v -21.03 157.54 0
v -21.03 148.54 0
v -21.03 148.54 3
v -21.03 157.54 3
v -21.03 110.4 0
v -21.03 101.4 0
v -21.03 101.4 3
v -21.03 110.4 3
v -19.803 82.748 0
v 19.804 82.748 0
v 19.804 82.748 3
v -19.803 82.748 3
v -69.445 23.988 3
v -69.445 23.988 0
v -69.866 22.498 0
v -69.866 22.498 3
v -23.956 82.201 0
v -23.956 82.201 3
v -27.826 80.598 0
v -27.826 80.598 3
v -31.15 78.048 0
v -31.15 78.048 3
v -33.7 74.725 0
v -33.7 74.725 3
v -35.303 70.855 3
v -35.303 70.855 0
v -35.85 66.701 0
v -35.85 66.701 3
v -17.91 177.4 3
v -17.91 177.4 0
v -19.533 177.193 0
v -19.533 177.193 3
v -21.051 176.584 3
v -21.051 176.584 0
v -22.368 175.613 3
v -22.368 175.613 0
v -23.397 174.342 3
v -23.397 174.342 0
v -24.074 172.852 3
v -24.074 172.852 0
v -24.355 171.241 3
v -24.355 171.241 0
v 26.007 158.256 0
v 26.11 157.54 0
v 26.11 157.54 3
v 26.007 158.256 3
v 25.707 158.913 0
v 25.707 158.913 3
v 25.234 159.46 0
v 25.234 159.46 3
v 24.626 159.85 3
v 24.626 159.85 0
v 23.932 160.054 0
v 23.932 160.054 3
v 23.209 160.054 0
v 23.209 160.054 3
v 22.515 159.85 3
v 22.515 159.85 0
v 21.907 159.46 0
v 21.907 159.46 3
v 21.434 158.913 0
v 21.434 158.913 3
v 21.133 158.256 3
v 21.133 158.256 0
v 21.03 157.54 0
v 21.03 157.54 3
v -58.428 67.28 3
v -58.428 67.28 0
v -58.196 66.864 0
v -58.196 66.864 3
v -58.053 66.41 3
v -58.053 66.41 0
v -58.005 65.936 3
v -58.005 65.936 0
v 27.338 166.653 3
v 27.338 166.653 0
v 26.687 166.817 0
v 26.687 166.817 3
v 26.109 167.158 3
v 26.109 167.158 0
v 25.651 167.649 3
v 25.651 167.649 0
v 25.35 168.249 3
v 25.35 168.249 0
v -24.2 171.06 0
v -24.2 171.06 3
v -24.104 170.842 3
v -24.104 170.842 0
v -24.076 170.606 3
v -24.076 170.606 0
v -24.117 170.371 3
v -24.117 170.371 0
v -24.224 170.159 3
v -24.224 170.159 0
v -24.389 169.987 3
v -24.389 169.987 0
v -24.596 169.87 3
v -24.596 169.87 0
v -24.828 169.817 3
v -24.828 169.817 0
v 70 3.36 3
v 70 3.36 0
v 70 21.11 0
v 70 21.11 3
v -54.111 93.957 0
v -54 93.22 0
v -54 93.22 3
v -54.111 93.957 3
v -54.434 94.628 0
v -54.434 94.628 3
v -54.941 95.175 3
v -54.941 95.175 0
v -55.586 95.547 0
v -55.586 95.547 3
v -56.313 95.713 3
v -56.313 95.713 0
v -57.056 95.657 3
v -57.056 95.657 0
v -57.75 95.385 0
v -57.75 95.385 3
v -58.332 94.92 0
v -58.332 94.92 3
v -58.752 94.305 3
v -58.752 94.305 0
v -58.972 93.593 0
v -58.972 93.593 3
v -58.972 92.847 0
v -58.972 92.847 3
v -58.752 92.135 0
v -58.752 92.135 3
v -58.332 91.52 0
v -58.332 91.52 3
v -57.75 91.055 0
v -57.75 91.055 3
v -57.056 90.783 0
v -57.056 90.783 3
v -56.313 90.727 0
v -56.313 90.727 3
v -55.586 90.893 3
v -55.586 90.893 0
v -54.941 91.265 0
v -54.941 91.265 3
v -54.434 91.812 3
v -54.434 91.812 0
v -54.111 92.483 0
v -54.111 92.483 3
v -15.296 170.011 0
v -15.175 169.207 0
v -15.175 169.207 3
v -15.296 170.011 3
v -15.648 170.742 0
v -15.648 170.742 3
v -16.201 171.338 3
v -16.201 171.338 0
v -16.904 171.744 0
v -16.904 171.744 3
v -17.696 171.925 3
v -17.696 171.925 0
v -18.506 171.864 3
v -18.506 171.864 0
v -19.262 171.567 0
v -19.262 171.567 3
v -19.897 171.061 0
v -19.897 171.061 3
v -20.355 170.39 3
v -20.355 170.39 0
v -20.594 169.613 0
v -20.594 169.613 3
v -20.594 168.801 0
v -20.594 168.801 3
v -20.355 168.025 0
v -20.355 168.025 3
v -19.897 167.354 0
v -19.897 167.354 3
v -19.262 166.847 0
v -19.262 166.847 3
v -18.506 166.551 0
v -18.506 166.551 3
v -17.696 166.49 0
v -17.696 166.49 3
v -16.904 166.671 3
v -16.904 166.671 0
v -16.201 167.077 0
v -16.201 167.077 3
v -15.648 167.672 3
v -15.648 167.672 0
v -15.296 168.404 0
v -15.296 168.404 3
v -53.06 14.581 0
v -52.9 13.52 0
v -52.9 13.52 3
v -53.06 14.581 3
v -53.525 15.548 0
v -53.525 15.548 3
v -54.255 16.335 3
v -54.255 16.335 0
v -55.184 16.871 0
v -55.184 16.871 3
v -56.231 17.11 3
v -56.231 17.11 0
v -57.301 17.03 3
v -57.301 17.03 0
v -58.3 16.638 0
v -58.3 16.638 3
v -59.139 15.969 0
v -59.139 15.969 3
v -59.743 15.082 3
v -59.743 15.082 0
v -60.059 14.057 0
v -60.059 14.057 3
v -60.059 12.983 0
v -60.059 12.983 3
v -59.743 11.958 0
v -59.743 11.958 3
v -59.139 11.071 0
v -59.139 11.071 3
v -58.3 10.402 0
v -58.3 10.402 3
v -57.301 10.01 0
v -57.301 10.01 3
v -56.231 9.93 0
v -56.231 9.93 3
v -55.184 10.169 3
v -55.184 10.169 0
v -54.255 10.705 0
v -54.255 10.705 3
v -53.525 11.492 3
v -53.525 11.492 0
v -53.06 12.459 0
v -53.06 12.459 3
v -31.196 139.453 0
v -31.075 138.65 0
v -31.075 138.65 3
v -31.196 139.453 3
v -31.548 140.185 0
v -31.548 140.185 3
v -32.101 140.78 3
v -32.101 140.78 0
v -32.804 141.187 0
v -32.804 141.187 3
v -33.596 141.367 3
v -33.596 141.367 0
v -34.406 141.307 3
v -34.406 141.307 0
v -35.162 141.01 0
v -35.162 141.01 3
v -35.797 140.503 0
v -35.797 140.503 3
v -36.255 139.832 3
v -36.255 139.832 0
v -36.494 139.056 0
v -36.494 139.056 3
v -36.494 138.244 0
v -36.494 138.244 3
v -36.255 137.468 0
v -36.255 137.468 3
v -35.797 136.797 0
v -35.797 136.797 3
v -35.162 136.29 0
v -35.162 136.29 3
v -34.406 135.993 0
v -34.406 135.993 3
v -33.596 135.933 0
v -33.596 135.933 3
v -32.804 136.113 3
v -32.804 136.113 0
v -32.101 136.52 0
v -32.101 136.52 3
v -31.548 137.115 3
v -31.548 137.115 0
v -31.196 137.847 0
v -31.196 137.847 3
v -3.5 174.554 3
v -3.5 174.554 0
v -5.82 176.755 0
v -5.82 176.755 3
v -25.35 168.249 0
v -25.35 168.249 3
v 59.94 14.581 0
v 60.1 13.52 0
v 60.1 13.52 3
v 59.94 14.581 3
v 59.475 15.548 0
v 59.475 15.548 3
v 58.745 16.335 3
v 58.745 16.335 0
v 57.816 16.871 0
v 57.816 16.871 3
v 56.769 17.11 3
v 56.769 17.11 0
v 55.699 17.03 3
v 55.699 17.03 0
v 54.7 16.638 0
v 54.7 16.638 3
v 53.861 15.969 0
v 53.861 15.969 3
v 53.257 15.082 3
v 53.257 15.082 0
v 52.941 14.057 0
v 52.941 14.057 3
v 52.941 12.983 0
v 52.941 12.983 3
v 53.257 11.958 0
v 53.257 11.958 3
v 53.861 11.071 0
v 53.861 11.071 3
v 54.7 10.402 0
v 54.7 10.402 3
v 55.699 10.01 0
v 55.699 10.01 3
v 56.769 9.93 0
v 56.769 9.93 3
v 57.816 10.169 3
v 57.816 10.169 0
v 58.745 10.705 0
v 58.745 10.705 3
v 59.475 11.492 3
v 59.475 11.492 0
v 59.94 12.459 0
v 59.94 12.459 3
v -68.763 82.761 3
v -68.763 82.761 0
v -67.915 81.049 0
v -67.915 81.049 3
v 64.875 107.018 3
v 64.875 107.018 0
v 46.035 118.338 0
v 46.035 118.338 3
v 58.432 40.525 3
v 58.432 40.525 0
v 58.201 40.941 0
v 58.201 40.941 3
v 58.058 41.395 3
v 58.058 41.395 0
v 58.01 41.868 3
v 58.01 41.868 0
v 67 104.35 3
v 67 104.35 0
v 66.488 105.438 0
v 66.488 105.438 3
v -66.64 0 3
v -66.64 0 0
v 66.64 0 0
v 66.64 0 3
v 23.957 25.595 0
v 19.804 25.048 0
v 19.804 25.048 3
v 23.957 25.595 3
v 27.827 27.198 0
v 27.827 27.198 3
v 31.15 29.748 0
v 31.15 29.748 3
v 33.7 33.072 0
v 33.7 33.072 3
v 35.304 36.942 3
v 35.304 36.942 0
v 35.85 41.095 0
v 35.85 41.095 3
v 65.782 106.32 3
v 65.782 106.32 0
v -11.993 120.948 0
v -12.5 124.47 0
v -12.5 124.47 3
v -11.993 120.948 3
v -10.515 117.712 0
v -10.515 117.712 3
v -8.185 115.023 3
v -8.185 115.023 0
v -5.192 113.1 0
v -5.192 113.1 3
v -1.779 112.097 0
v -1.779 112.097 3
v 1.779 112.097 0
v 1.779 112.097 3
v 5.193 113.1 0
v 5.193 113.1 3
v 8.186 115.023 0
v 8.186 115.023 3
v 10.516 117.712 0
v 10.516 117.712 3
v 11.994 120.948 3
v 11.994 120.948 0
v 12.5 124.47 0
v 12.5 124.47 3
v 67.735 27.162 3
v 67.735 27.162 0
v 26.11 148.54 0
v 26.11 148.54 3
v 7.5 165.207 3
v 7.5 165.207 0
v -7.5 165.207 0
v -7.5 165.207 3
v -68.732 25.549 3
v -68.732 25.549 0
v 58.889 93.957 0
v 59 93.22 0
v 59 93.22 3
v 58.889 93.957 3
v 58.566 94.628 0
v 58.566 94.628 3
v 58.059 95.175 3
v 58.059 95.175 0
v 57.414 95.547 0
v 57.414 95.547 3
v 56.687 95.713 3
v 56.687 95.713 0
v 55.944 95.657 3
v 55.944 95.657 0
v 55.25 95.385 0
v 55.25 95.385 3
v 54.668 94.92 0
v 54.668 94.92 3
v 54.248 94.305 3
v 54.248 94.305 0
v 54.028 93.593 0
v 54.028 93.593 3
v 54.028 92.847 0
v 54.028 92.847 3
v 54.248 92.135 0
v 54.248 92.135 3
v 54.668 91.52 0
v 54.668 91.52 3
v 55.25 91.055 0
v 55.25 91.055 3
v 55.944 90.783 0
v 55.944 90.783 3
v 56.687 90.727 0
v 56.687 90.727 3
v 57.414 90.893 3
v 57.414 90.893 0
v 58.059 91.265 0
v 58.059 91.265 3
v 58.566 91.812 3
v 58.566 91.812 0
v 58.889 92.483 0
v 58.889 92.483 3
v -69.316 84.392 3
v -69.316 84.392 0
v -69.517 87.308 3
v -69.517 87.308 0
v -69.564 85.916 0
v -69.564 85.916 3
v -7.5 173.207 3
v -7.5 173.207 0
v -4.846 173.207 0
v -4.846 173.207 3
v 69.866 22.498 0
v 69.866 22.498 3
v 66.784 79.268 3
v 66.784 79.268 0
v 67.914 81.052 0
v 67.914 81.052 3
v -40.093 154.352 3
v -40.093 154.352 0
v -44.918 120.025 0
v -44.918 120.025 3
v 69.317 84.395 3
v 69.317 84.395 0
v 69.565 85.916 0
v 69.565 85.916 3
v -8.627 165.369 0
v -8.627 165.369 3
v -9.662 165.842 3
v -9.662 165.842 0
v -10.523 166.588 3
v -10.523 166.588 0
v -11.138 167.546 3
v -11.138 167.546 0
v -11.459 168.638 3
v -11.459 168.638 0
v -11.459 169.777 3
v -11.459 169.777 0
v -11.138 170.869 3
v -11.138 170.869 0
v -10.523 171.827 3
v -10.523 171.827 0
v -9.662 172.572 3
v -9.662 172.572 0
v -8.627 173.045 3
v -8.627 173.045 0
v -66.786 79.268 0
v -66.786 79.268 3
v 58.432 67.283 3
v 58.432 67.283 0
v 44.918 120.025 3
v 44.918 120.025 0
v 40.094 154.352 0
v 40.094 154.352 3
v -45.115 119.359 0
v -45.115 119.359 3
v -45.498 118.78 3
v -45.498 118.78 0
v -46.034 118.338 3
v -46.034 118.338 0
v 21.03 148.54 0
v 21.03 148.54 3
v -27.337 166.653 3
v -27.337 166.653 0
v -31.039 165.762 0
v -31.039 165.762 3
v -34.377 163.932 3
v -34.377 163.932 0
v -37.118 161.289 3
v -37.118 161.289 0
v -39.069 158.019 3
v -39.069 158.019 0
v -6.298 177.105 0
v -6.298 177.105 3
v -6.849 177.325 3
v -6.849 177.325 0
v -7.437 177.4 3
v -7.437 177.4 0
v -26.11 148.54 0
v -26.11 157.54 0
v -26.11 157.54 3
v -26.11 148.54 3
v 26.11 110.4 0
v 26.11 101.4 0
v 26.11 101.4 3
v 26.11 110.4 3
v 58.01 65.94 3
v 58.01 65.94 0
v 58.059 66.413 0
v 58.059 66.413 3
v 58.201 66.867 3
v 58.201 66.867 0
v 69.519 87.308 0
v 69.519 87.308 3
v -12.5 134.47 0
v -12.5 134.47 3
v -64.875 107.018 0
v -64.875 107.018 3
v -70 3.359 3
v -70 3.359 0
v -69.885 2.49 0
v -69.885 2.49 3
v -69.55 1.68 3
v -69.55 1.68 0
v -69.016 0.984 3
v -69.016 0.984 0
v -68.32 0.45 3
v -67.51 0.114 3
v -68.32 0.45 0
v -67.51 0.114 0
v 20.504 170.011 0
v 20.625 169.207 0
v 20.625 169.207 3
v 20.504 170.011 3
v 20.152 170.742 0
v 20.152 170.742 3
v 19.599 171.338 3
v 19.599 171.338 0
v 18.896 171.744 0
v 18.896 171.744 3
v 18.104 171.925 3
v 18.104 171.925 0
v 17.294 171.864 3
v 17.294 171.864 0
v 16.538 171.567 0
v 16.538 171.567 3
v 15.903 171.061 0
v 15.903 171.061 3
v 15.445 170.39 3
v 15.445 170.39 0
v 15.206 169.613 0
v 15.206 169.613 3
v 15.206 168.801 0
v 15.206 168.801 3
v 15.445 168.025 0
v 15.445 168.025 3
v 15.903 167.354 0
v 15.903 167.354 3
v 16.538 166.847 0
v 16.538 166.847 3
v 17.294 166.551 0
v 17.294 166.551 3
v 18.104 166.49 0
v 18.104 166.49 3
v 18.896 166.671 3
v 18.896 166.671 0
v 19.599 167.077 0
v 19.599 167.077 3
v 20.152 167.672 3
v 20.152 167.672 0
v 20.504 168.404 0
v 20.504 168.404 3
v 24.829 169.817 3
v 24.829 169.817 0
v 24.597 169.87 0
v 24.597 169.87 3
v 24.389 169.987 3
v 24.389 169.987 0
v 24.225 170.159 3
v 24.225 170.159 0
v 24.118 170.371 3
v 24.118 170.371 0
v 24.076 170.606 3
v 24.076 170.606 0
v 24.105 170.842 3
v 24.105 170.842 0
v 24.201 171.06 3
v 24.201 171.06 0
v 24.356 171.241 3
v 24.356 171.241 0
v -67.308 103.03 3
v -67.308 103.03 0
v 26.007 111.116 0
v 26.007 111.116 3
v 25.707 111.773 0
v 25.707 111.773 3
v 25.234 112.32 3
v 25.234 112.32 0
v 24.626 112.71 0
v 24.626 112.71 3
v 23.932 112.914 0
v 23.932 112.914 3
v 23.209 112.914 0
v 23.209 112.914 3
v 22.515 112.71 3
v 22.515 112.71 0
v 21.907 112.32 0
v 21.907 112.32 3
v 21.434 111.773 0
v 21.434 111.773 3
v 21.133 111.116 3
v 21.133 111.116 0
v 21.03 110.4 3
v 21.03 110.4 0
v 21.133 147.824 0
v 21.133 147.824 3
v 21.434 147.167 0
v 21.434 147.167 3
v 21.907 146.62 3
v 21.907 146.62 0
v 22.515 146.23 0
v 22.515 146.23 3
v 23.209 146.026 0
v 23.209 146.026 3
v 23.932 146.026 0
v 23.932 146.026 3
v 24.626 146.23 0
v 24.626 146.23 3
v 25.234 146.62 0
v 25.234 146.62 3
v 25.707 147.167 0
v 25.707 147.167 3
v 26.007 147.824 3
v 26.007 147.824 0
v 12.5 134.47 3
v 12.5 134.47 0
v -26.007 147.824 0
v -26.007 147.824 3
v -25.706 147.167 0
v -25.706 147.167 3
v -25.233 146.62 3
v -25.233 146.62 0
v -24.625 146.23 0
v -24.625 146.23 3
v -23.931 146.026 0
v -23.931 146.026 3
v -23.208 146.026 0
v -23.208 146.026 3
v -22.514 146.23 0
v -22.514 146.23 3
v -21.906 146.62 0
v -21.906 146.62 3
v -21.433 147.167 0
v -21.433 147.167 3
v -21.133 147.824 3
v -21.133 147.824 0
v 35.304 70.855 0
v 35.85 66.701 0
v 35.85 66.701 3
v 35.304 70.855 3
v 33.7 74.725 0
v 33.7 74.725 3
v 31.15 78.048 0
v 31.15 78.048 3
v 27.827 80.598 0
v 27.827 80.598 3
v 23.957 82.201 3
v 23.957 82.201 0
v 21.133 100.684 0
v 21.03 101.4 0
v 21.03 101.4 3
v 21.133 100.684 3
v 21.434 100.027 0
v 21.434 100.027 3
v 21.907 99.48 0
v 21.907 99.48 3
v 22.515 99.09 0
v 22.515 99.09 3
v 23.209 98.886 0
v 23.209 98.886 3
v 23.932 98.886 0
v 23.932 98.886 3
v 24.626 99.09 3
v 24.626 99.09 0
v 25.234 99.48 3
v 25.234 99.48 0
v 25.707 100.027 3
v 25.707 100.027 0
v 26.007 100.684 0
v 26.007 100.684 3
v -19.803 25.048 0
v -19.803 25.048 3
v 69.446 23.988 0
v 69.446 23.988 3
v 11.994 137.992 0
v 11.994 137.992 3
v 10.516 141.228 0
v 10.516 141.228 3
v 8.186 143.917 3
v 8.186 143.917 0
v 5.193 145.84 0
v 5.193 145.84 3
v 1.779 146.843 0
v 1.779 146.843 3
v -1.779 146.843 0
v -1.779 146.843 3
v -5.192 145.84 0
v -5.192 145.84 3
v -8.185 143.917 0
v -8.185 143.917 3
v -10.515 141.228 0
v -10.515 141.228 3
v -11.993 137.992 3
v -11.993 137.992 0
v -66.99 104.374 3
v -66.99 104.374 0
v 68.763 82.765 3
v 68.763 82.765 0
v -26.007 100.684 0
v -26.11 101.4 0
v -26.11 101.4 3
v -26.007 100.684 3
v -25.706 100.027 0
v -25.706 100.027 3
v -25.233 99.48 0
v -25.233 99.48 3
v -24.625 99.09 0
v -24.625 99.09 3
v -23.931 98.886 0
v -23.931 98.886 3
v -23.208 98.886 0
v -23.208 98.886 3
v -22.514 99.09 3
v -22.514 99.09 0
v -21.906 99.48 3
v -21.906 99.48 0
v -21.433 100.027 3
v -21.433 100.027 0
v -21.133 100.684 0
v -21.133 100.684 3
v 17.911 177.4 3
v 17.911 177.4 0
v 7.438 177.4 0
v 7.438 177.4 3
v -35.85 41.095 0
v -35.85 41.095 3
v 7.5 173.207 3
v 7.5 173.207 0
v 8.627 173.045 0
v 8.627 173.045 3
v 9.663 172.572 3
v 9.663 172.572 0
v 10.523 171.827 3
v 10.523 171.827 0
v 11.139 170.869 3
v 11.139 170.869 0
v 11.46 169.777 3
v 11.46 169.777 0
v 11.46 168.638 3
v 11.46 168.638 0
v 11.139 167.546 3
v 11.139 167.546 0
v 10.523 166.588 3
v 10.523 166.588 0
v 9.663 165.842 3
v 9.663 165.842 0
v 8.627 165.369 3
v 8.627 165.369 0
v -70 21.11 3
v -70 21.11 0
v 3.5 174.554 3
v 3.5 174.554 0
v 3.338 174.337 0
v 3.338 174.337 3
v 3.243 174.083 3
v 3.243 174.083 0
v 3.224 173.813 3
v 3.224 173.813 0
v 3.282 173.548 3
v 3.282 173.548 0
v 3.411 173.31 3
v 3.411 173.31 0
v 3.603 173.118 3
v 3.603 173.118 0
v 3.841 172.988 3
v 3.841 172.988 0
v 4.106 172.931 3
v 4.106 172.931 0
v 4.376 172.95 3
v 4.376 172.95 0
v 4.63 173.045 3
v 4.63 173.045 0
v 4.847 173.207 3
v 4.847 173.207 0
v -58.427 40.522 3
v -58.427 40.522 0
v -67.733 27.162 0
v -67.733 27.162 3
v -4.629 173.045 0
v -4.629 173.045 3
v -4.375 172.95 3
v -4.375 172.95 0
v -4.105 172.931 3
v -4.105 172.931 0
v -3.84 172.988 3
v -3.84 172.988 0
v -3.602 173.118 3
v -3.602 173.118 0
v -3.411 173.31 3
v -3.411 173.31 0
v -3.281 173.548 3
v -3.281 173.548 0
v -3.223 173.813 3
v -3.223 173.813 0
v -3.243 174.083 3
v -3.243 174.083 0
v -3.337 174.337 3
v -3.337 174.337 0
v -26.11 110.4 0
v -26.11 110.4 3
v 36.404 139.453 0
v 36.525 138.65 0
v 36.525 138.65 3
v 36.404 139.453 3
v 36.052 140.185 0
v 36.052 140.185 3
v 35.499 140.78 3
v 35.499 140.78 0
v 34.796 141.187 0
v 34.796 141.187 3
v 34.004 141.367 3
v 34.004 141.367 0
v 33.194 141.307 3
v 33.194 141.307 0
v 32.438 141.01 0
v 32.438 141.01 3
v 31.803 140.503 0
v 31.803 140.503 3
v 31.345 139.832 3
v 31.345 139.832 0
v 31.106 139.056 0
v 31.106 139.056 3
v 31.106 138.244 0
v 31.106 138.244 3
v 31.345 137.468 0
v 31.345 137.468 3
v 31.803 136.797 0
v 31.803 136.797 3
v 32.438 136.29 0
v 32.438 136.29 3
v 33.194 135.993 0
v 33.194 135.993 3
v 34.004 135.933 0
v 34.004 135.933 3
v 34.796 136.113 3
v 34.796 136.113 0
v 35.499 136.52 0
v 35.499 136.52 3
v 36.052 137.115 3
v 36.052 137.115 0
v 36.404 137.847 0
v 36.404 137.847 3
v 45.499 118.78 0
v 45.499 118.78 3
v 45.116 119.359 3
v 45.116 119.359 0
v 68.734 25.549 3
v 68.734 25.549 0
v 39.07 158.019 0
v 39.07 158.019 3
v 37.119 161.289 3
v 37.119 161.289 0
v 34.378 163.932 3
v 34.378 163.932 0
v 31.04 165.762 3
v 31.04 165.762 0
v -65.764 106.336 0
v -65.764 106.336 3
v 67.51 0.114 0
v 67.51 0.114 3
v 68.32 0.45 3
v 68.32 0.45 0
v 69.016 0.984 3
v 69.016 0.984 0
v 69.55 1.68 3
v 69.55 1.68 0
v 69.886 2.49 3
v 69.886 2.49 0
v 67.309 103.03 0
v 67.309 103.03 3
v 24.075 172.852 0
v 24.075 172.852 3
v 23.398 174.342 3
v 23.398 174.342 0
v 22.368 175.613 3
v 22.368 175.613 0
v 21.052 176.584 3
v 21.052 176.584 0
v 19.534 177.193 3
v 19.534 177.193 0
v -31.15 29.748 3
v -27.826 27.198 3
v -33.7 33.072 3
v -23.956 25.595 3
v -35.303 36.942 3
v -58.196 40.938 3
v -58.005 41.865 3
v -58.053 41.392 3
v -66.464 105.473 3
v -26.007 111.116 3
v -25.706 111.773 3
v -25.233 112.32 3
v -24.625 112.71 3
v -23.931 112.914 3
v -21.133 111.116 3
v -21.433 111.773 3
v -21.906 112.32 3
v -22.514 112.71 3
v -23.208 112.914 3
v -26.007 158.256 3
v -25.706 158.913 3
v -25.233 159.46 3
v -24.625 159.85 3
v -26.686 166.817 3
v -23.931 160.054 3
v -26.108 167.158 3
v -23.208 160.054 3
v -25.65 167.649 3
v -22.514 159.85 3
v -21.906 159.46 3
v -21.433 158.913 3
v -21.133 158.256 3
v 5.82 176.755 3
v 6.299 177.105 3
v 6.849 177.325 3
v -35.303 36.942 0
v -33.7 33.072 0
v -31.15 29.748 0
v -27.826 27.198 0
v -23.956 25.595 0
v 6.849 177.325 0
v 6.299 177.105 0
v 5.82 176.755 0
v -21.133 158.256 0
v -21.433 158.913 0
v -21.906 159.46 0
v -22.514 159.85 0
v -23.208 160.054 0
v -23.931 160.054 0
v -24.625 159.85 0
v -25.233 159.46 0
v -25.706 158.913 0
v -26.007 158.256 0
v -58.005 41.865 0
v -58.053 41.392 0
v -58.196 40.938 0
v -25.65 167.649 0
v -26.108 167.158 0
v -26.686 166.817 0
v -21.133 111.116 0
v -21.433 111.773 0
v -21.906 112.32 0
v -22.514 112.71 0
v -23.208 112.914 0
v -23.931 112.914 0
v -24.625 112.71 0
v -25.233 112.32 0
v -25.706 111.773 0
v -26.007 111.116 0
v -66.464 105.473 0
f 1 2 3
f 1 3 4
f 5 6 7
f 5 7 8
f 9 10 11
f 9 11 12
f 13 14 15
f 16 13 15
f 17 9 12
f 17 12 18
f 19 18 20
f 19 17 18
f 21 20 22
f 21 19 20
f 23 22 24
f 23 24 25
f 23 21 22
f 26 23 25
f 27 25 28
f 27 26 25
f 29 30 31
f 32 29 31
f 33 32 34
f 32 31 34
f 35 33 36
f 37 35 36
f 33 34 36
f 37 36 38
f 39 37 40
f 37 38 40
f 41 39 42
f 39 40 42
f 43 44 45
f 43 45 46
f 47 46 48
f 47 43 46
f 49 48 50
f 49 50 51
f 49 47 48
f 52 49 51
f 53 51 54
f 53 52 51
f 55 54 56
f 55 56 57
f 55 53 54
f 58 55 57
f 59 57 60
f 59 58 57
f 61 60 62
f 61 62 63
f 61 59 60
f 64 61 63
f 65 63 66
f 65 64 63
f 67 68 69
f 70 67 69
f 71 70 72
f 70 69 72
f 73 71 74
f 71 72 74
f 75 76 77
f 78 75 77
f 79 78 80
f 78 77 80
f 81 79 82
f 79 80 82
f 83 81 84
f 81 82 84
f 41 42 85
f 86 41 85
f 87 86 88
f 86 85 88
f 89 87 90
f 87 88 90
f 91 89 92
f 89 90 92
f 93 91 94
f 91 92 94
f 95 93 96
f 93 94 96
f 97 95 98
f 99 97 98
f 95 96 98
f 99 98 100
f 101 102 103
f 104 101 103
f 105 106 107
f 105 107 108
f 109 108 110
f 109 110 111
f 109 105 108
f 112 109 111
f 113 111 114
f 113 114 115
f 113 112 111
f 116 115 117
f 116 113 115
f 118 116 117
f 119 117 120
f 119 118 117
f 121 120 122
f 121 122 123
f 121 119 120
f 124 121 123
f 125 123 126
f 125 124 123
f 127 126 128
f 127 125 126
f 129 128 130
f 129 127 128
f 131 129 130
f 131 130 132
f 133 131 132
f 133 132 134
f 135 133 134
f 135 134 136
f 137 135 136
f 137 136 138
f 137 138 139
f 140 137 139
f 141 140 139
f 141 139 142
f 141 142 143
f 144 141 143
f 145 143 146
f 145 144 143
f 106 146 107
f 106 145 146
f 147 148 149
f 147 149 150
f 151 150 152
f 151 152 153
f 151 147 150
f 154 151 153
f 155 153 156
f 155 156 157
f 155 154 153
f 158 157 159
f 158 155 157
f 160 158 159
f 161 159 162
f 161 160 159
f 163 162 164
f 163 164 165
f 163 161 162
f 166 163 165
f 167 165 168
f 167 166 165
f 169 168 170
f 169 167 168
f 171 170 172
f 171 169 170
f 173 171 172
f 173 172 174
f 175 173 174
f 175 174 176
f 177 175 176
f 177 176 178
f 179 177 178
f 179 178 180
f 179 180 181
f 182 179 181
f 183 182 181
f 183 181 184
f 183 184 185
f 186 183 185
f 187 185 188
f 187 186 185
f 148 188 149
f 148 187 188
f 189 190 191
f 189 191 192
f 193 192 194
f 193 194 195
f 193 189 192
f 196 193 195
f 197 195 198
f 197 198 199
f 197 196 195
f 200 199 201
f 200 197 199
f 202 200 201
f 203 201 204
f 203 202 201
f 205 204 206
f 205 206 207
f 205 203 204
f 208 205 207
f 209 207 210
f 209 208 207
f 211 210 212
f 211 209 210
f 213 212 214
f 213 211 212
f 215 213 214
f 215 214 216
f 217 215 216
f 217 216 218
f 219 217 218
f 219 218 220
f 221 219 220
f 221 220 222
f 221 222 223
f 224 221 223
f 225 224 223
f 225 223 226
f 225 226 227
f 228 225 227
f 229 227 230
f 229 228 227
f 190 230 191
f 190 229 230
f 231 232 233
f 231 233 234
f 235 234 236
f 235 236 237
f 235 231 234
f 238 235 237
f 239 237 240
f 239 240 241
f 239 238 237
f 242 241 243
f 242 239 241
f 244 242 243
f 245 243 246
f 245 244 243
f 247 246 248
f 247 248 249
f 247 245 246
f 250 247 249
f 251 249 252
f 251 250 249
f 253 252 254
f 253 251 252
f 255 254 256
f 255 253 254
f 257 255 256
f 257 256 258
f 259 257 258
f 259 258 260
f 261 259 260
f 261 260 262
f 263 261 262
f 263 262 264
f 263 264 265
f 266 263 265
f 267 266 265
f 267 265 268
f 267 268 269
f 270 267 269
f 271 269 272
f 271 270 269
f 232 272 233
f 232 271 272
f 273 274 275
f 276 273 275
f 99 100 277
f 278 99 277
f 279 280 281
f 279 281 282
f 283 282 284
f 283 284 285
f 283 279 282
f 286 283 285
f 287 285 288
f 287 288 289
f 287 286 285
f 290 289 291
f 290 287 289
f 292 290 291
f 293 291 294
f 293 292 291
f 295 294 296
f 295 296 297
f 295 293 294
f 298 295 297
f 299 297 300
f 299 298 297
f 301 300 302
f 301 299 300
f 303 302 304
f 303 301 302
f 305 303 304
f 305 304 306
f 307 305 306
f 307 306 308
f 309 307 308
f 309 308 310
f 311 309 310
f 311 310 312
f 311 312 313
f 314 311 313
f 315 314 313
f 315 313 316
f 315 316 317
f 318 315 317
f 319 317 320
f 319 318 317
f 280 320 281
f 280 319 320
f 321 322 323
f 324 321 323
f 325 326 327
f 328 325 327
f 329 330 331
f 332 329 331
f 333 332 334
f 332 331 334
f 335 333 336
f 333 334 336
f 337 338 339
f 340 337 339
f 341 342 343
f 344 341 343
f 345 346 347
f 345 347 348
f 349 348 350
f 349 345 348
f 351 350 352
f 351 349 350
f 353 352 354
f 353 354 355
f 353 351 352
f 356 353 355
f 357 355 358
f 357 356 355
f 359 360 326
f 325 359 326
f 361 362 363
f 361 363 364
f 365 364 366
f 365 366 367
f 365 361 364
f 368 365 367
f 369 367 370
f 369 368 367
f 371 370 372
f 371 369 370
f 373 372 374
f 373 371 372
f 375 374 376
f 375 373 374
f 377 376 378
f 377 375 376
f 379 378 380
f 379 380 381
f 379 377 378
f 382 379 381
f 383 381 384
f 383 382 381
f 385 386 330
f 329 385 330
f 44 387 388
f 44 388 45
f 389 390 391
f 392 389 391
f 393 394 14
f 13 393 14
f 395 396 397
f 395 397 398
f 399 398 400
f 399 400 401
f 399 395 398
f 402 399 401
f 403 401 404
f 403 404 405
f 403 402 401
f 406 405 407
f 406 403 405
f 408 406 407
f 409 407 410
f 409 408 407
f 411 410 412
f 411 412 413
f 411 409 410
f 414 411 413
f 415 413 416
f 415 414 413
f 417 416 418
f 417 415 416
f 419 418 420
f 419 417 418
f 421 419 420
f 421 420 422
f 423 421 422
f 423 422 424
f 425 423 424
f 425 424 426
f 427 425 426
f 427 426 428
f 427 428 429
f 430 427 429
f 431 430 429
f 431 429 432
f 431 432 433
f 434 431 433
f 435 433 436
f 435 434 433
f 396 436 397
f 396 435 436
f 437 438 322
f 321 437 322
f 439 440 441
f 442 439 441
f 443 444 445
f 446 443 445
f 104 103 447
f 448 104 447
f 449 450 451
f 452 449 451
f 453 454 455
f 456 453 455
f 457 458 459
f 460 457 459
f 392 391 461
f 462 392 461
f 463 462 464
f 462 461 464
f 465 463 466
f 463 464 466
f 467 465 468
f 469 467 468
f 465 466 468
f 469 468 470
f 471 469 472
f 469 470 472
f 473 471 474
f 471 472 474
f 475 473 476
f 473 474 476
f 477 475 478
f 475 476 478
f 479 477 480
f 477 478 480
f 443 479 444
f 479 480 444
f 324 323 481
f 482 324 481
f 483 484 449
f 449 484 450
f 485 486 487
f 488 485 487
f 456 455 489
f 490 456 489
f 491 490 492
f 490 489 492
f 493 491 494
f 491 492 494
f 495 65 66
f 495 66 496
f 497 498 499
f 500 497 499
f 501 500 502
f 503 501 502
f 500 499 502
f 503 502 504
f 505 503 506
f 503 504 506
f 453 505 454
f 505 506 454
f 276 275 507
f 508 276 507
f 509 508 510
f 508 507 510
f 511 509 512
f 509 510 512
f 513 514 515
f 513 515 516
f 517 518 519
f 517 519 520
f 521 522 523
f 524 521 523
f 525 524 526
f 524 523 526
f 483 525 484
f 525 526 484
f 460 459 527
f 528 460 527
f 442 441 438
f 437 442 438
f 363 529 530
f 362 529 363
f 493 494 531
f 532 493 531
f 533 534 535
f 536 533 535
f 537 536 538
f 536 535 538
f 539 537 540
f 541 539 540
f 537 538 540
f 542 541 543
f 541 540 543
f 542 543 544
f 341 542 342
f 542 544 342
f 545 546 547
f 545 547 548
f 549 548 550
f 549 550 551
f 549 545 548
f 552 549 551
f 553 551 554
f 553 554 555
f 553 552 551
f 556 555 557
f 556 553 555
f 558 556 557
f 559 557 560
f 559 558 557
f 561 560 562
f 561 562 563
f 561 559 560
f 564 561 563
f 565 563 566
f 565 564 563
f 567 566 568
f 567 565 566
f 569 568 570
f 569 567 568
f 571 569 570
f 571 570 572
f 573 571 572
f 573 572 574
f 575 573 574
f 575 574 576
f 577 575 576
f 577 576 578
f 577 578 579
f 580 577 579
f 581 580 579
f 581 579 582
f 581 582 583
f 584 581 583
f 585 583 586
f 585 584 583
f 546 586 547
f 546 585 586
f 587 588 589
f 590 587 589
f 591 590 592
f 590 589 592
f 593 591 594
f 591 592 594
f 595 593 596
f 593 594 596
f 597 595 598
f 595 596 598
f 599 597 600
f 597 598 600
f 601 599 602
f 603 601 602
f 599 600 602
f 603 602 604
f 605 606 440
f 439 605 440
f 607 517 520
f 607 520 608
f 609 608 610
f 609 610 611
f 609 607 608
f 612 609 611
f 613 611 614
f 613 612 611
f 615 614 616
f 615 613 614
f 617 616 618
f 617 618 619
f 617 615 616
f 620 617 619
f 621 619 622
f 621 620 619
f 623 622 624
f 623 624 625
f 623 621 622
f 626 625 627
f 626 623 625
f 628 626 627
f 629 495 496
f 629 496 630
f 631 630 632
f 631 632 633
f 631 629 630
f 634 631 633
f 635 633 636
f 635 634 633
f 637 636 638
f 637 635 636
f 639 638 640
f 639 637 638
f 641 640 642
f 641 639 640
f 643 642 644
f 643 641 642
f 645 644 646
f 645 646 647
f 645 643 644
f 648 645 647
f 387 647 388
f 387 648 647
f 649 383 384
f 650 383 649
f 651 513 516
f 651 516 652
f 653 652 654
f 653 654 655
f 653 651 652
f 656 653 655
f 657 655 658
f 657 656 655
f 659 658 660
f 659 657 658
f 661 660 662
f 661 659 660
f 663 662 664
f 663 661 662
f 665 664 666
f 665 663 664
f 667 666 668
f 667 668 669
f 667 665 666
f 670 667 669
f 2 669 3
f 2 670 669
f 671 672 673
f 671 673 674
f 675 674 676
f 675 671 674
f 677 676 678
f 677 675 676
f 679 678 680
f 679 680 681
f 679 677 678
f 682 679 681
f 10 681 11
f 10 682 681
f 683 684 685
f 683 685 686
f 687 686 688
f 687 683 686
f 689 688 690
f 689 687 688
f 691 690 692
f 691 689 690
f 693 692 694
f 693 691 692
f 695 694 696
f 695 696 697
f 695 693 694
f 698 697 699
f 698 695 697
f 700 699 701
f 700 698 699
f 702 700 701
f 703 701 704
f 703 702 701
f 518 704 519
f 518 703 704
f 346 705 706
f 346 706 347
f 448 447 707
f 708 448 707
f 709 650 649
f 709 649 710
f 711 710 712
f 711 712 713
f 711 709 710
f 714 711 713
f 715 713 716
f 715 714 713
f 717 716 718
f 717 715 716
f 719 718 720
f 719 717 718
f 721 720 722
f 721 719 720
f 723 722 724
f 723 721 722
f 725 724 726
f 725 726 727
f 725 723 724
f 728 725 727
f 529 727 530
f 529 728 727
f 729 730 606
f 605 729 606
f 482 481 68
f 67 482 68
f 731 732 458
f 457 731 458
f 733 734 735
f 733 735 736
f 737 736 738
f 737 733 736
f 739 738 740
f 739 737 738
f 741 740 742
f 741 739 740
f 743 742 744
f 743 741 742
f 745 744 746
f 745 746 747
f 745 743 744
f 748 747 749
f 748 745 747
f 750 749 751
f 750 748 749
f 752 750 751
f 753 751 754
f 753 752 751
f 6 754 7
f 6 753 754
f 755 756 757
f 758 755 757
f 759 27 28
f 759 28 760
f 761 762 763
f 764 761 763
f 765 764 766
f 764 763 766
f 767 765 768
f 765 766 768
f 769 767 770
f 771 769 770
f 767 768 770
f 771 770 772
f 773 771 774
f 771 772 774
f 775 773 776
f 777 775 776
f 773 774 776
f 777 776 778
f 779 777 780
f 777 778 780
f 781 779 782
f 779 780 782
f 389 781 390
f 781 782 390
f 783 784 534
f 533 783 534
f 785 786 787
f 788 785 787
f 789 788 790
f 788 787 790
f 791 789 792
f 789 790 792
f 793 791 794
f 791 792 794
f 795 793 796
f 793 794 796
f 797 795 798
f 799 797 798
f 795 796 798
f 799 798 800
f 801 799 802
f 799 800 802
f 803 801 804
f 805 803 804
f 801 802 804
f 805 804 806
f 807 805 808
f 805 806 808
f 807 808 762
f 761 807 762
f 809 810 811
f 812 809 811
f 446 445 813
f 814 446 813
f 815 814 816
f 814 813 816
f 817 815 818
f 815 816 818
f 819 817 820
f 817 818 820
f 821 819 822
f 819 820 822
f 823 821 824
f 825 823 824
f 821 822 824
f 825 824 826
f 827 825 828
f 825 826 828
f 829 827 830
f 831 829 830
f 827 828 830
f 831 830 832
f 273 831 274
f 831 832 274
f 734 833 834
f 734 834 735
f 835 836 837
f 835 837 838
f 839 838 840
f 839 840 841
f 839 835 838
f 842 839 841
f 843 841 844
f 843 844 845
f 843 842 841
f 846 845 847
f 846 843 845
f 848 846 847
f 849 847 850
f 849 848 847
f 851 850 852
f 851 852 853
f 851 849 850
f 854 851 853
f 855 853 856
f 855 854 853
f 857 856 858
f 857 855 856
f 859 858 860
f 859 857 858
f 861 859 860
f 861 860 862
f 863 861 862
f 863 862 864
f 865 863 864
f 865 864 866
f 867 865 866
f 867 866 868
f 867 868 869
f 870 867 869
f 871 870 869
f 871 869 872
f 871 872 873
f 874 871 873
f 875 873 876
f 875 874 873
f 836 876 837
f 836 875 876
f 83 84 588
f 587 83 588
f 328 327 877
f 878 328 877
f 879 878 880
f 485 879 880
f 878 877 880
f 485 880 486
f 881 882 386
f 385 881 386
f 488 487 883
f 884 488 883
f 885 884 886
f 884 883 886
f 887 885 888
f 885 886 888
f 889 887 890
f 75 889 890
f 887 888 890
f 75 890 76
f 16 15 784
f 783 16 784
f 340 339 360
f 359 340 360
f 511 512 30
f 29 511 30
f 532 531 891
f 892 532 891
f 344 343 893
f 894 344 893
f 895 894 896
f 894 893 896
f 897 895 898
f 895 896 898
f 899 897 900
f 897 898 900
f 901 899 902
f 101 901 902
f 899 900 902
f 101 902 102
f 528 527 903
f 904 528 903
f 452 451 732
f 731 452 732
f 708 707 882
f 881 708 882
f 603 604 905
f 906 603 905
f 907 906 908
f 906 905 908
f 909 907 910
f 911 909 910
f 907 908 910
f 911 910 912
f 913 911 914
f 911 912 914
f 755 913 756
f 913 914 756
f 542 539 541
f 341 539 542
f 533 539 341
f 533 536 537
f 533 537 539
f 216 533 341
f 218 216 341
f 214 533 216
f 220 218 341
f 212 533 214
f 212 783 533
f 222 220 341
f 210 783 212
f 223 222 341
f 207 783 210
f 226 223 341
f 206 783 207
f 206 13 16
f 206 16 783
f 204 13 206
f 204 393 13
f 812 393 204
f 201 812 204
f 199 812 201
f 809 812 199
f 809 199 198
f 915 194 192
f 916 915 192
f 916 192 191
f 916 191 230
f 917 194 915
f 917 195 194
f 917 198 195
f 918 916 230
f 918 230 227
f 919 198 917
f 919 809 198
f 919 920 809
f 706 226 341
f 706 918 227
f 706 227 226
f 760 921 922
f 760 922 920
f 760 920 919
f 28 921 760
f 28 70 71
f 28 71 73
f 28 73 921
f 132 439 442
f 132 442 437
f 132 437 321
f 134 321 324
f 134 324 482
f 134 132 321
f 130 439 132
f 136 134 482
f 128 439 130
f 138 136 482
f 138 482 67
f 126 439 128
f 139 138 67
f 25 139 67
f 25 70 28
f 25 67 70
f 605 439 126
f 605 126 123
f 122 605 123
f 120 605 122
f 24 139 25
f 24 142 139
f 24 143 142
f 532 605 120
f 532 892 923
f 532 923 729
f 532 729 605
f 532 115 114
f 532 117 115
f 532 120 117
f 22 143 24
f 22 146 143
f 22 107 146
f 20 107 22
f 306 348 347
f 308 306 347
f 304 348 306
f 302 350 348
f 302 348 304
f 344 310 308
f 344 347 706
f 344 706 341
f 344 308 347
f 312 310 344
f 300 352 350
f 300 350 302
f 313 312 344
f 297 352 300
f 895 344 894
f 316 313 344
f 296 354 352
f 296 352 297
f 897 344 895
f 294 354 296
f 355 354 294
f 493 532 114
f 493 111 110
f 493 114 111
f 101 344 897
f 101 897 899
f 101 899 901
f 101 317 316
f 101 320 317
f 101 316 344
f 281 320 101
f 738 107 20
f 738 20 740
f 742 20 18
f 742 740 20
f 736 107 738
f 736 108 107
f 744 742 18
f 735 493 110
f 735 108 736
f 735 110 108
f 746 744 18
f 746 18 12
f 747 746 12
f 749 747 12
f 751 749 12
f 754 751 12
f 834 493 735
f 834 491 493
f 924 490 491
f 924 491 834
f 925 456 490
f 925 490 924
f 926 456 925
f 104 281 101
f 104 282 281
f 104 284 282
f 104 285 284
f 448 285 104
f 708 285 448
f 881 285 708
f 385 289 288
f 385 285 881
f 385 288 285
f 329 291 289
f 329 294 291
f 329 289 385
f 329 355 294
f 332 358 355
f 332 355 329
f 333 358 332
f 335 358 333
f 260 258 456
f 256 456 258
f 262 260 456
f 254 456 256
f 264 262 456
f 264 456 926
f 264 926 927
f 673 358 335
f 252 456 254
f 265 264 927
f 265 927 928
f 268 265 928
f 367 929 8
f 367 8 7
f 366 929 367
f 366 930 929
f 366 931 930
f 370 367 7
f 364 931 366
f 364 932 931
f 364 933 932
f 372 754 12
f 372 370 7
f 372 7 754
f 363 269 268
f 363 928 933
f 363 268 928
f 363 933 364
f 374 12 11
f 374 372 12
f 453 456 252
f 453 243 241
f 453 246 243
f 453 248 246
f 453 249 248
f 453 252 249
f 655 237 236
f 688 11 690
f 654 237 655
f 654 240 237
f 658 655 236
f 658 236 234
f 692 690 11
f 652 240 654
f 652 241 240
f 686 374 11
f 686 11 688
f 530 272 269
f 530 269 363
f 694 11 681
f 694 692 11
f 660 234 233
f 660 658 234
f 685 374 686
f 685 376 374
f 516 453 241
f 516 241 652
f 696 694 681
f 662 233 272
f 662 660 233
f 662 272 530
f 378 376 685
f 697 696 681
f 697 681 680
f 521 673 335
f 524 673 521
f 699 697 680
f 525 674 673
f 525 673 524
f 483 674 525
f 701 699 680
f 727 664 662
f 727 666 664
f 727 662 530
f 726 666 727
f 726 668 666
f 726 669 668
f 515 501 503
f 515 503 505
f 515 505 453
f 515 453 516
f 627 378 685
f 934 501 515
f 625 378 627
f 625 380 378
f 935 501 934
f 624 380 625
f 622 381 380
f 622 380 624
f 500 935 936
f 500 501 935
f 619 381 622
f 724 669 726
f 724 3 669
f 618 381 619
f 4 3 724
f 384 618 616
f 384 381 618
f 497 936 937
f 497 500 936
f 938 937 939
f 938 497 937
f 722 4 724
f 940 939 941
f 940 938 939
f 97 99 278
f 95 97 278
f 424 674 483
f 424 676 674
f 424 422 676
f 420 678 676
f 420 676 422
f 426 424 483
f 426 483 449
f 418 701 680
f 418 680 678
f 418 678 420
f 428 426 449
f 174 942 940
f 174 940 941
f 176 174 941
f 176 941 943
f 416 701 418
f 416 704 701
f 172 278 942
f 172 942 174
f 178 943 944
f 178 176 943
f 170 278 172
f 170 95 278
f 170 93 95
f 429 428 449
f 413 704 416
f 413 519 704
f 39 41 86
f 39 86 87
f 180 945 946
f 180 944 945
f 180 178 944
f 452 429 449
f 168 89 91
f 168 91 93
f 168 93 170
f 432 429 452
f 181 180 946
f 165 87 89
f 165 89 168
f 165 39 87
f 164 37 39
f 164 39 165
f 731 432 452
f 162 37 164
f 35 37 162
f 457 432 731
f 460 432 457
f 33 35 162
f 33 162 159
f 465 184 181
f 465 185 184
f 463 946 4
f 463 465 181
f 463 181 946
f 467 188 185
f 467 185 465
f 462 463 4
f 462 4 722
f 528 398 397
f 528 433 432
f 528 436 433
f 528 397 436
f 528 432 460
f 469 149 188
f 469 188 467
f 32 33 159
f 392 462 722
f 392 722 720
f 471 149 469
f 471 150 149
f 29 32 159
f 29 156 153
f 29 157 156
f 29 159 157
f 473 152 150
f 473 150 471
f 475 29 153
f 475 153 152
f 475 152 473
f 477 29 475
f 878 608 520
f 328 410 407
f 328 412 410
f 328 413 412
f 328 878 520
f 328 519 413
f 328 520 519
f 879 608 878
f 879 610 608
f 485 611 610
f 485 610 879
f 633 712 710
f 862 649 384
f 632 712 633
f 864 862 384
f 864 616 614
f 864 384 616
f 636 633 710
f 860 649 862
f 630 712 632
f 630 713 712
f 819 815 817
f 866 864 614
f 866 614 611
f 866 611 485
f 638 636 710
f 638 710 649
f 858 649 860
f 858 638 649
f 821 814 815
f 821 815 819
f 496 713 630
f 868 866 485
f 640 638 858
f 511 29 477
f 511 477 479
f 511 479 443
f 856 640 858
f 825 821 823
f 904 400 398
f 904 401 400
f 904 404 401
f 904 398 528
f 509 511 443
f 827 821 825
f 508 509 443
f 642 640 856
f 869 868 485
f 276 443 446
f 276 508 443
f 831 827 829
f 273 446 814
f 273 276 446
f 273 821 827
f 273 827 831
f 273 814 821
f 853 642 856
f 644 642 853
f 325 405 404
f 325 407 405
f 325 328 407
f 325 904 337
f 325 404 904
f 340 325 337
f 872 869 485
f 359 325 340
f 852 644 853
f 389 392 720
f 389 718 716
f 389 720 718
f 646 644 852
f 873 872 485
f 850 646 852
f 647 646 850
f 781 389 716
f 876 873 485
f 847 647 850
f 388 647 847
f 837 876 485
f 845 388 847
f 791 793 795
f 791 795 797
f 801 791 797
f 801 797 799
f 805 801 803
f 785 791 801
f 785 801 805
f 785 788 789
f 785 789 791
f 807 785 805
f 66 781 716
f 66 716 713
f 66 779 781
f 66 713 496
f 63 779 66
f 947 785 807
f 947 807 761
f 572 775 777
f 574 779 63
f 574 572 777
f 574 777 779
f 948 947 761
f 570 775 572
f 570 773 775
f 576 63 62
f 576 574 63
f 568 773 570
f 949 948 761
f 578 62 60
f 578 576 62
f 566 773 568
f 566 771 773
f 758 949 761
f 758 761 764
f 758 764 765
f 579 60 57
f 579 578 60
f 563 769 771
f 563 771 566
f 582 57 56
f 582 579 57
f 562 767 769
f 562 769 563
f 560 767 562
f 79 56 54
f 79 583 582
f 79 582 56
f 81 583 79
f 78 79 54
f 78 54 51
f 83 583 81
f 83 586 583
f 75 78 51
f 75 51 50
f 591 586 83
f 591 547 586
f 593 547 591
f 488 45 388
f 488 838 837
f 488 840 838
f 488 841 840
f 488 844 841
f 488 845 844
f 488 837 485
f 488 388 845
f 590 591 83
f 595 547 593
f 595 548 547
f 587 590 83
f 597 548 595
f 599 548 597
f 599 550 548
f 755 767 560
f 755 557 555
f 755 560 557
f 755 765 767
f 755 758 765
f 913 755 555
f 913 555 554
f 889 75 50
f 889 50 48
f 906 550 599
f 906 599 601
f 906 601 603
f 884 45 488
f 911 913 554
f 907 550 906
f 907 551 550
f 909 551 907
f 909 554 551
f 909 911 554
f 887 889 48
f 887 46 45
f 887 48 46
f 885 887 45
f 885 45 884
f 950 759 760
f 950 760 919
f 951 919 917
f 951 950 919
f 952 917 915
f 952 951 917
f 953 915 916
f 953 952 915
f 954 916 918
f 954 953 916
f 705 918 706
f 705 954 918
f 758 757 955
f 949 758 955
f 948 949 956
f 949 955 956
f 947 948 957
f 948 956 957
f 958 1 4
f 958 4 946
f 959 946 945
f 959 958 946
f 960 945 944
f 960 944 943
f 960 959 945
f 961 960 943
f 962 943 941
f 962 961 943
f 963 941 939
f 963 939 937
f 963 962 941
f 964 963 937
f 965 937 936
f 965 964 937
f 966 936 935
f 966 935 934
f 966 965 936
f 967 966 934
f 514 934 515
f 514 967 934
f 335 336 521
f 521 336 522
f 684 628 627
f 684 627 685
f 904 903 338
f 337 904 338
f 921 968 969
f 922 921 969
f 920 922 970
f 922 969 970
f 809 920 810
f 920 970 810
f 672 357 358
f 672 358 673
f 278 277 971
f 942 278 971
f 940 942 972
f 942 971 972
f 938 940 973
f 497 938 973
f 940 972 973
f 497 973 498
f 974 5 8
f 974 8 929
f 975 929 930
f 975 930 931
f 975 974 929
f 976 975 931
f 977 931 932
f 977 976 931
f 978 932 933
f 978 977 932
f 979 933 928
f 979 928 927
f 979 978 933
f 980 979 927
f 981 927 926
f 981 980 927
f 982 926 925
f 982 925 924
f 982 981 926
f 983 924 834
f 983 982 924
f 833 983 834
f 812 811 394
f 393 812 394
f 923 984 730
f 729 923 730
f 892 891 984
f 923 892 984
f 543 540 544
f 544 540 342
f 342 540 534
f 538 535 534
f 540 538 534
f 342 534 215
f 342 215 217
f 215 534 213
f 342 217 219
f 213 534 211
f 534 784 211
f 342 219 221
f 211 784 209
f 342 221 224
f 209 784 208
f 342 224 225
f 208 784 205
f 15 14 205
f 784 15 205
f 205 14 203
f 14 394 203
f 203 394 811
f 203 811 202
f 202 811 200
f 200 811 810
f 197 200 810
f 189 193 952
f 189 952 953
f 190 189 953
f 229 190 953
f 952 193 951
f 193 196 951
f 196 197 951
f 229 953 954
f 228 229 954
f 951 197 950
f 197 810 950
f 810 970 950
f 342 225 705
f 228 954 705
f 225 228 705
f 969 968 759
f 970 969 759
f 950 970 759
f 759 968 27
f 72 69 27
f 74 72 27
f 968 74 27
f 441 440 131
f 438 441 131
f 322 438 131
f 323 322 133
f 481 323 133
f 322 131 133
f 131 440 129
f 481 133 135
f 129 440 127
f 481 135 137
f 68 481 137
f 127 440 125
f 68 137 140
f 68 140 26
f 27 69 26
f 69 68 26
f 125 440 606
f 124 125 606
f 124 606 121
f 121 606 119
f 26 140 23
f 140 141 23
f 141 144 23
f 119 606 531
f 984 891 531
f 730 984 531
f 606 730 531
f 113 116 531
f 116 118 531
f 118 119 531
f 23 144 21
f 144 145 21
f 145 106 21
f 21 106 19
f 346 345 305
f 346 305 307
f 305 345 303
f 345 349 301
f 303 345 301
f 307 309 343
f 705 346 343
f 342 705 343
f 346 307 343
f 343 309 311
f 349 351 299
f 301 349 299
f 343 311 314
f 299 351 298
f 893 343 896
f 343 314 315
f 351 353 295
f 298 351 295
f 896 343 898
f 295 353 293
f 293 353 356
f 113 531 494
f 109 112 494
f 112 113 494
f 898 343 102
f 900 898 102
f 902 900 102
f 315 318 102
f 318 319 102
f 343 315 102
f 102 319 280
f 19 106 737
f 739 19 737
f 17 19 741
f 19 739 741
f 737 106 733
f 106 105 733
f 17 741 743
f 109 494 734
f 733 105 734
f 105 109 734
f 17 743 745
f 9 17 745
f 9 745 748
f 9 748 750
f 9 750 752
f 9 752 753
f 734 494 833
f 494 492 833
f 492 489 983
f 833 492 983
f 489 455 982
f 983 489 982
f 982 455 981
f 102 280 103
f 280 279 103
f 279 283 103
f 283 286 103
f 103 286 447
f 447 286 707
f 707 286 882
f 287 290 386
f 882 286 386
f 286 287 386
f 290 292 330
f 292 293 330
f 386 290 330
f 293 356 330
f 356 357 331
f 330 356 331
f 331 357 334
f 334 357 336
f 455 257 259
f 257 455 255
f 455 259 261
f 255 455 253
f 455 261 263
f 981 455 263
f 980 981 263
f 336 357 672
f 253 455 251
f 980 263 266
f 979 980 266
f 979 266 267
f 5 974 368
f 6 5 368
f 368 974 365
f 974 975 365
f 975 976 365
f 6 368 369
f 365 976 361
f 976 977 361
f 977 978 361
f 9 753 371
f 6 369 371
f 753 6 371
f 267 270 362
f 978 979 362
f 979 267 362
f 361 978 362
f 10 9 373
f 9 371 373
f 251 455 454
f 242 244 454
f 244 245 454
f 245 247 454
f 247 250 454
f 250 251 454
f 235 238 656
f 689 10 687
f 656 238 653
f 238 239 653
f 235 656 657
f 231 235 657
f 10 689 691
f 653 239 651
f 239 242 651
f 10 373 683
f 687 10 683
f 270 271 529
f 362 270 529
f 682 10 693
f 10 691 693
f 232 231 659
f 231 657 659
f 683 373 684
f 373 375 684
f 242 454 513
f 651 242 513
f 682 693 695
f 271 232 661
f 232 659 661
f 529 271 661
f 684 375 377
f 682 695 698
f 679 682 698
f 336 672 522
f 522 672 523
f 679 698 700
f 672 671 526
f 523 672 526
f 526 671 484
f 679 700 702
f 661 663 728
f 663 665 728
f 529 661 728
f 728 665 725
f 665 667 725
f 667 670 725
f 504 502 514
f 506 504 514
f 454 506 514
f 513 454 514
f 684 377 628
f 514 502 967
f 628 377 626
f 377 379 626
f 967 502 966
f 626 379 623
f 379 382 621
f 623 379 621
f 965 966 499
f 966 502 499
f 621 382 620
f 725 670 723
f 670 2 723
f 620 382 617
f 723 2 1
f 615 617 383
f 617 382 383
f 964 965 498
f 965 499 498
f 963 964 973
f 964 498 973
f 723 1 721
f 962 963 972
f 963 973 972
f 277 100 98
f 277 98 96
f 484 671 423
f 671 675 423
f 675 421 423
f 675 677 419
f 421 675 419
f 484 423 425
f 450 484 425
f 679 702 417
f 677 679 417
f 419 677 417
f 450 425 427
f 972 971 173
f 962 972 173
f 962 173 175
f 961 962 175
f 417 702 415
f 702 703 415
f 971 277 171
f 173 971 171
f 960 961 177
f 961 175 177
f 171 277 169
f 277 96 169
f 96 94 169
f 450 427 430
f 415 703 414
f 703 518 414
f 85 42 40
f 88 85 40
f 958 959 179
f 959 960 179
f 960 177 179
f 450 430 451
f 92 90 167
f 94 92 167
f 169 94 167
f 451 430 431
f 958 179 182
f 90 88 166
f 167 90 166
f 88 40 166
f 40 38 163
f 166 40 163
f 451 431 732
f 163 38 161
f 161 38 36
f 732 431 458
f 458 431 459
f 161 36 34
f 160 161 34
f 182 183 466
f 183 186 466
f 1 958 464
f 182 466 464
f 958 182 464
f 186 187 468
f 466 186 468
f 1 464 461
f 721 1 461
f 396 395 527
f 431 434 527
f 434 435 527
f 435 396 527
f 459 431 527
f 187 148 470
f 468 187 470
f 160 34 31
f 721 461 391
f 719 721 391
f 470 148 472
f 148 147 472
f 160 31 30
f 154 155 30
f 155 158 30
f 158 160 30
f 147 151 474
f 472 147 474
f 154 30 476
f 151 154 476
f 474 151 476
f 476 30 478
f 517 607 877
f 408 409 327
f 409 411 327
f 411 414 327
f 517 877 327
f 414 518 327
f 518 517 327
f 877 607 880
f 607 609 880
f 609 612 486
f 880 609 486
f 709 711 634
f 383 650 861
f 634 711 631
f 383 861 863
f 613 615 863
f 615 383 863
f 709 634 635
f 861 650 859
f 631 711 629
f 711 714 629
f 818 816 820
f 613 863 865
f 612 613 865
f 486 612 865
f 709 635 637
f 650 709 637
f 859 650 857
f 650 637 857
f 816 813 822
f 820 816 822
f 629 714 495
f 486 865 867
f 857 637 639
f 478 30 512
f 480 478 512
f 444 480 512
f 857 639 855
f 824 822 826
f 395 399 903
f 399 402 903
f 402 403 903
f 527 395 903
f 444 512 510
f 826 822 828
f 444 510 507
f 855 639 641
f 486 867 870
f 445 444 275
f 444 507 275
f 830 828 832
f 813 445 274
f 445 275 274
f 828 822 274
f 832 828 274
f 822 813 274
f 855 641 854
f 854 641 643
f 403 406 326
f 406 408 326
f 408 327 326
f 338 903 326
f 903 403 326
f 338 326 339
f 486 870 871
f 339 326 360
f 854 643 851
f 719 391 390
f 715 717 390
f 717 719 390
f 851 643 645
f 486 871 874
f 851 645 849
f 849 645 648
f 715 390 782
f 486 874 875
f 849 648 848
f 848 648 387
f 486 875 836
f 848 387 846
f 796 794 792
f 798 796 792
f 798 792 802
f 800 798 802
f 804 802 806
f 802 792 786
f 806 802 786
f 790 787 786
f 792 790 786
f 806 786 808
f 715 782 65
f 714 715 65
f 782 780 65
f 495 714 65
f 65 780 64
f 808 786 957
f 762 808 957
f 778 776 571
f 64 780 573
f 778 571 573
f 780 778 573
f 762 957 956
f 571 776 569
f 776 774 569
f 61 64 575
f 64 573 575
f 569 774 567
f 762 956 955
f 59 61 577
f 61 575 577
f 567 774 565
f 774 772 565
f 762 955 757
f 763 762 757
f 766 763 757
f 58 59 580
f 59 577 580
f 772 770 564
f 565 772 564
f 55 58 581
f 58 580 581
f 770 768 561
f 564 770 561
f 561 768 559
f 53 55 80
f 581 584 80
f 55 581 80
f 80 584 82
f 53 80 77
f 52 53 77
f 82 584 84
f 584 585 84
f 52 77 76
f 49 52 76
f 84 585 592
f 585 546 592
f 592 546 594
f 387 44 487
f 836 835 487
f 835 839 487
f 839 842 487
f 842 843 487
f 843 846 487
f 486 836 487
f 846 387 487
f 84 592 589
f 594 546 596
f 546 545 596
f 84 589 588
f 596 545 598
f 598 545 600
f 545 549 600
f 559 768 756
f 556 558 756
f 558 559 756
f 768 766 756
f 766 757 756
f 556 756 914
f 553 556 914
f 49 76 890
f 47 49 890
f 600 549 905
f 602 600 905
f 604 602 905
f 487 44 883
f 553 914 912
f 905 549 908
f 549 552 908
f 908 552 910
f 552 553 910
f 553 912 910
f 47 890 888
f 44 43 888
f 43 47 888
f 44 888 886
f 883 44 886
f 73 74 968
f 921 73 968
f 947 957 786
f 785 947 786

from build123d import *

# Parameters (mm, degrees)
MODEL_R             = 3.6
MODEL_R_2           = 2.725
MODEL_R_3           = 2.5
BOSS_EXTRUDE1_DEPTH = 3


with BuildPart() as part:
    # Model → Boss-Extrude1 (new body)
    with BuildSketch(Plane.XY):
        with BuildLine():
            Line((-66.64035, 0), (66.64035, 0))
            ThreePointArc((66.64035, 0), (69.016228785, 0.984121215), (70.00035, 3.36))
            Line((70.00035, 3.36), (70.00035, 21.1105))
            Line((70.00035, 21.1105), (69.86629813, 22.498114684))
            Line((69.86629813, 22.498114684), (69.446311232, 23.988387428))
            Line((69.446311232, 23.988387428), (68.733529412, 25.548929055))
            Line((68.733529412, 25.548929055), (67.734761359, 27.16155254))
            Line((67.734761359, 27.16155254), (58.431673409, 40.525169242))
            ThreePointArc((58.431673409, 40.525169242), (58.118153534, 41.164216889), (58.01035, 41.867818343))
            Line((58.01035, 41.867818343), (58.01035, 65.939651469))
            ThreePointArc((58.01035, 65.939651469), (58.11831888, 66.643779624), (58.432304432, 67.283206562))
            Line((58.432304432, 67.283206562), (66.78383855, 79.267931576))
            Line((66.78383855, 79.267931576), (67.914068691, 81.051661321))
            Line((67.914068691, 81.051661321), (68.763177176, 82.764680123))
            Line((68.763177176, 82.764680123), (69.316681884, 84.394671222))
            Line((69.316681884, 84.394671222), (69.565395366, 85.915970428))
            Line((69.565395366, 85.915970428), (69.519060346, 87.308284697))
            Line((69.519060346, 87.308284697), (67.30949192, 103.030180971))
            Line((67.30949192, 103.030180971), (66.999561947, 104.350057085))
            Line((66.999561947, 104.350057085), (66.487504991, 105.437863083))
            Line((66.487504991, 105.437863083), (65.782163484, 106.319853558))
            Line((65.782163484, 106.319853558), (64.875433482, 107.017560512))
            Line((64.875433482, 107.017560512), (46.0351373, 118.337952538))
            ThreePointArc((46.0351373, 118.337952538), (45.285845094, 119.055243779), (44.918346815, 120.025238907))
            Line((44.918346815, 120.025238907), (40.094015429, 154.352140382))
            ThreePointArc((40.094015429, 154.352140382), (35.836168672, 162.70125074), (27.337884769, 166.652968529))
            ThreePointArc((27.337884769, 166.652968529), (26.108825382, 167.158066229), (25.350203438, 168.24903067))
            Line((25.350203438, 168.24903067), (24.828755998, 169.817409171))
            ThreePointArc((24.828755998, 169.817409171), (24.117671094, 170.371357056), (24.355513409, 171.2408))
            ThreePointArc((24.355513409, 171.2408), (22.368316822, 175.612570409), (17.911140334, 177.4))
            Line((17.911140334, 177.4), (7.437786988, 177.4))
            ThreePointArc((7.437786988, 177.4), (6.567071518, 177.232740152), (5.820301357, 176.754769847))
            Line((5.820301357, 176.754769847), (3.50035, 174.5536))
            ThreePointArc((3.50035, 174.5536), (3.500375, 173.207275), (4.8467, 173.2073))
            Line((4.8467, 173.2073), (7.50035, 173.2073))
            ThreePointArc((7.50035, 173.2073), (11.50035, 169.2073), (7.50035, 165.2073))
            Line((7.50035, 165.2073), (-7.49965, 165.2073))
            ThreePointArc((-7.49965, 165.2073), (-11.49965, 169.2073), (-7.49965, 173.2073))
            Line((-7.49965, 173.2073), (-4.846, 173.2073))
            ThreePointArc((-4.846, 173.2073), (-3.499675, 173.207275), (-3.49965, 174.5536))
            Line((-3.49965, 174.5536), (-5.819601357, 176.754769848))
            ThreePointArc((-5.819601357, 176.754769848), (-6.566371518, 177.232740152), (-7.437086988, 177.4))
            Line((-7.437086988, 177.4), (-17.910440334, 177.4))
            ThreePointArc((-17.910440334, 177.4), (-22.367616822, 175.612570409), (-24.354813409, 171.2408))
            ThreePointArc((-24.354813409, 171.2408), (-24.116971094, 170.371357056), (-24.828055998, 169.817409171))
            Line((-24.828055998, 169.817409171), (-25.349503438, 168.24903067))
            ThreePointArc((-25.349503438, 168.24903067), (-26.108125382, 167.158066229), (-27.337184769, 166.652968529))
            ThreePointArc((-27.337184769, 166.652968529), (-35.835468672, 162.70125074), (-40.093315429, 154.352140382))
            Line((-40.093315429, 154.352140382), (-44.917646815, 120.025238907))
            ThreePointArc((-44.917646815, 120.025238907), (-45.285145095, 119.055243779), (-46.0344373, 118.337952538))
            Line((-46.0344373, 118.337952538), (-64.874733482, 107.017560512))
            Line((-64.874733482, 107.017560512), (-65.764454542, 106.336263813))
            Line((-65.764454542, 106.336263813), (-66.464064741, 105.473352073))
            Line((-66.464064741, 105.473352073), (-66.989930499, 104.37360872))
            Line((-66.989930499, 104.37360872), (-67.307930284, 103.030180971))
            Line((-67.307930284, 103.030180971), (-69.517498709, 87.308284697))
            Line((-69.517498709, 87.308284697), (-69.564336548, 85.915534746))
            Line((-69.564336548, 85.915534746), (-69.316250952, 84.392453689))
            Line((-69.316250952, 84.392453689), (-68.763104771, 82.761395172))
            Line((-68.763104771, 82.761395172), (-67.914669475, 81.049208688))
            Line((-67.914669475, 81.049208688), (-66.785659136, 79.267931576))
            Line((-66.785659136, 79.267931576), (-58.427548106, 67.280305558))
            ThreePointArc((-58.427548106, 67.280305558), (-58.113308938, 66.640672262), (-58.00525, 65.936257417))
            Line((-58.00525, 65.936257417), (-58.00525, 41.865084223))
            ThreePointArc((-58.00525, 41.865084223), (-58.113143434, 41.161196344), (-58.426916507, 40.521942406))
            Line((-58.426916507, 40.521942406), (-67.732826699, 27.16155254))
            Line((-67.732826699, 27.16155254), (-68.732119035, 25.548966105))
            Line((-68.732119035, 25.548966105), (-69.445294681, 23.988426858))
            Line((-69.445294681, 23.988426858), (-69.86552208, 22.498130488))
            Line((-69.86552208, 22.498130488), (-69.99965, 21.1105))
            Line((-69.99965, 21.1105), (-69.99965, 3.3593))
            ThreePointArc((-69.99965, 3.3593), (-69.01573381, 0.98391619), (-66.64035, 0))
        make_face()
        with Locations((-56.49965, 13.52)):
            Circle(MODEL_R, mode=Mode.SUBTRACT)
        with Locations((-17.89965, 169.2073)):
            Circle(MODEL_R_2, mode=Mode.SUBTRACT)
        with Locations((-33.79965, 138.65)):
            Circle(MODEL_R_2, mode=Mode.SUBTRACT)
        with Locations((-56.49965, 93.22)):
            Circle(MODEL_R_3, mode=Mode.SUBTRACT)
        with Locations((56.50035, 13.52)):
            Circle(MODEL_R, mode=Mode.SUBTRACT)
        with Locations((17.90035, 169.2073)):
            Circle(MODEL_R_2, mode=Mode.SUBTRACT)
        with Locations((33.80035, 138.65)):
            Circle(MODEL_R_2, mode=Mode.SUBTRACT)
        with Locations((56.50035, 93.22)):
            Circle(MODEL_R_3, mode=Mode.SUBTRACT)
        with BuildLine():
            Line((-19.80285, 25.0481), (19.80355, 25.0481))
            ThreePointArc((19.80355, 25.0481), (31.150351096, 29.748098904), (35.85035, 41.0949))
            Line((35.85035, 41.0949), (35.85035, 66.7013))
            ThreePointArc((35.85035, 66.7013), (31.150351096, 78.048101096), (19.80355, 82.7481))
            Line((19.80355, 82.7481), (-19.80285, 82.7481))
            ThreePointArc((-19.80285, 82.7481), (-31.149651096, 78.048101096), (-35.84965, 66.7013))
            Line((-35.84965, 66.7013), (-35.84965, 41.0949))
            ThreePointArc((-35.84965, 41.0949), (-31.149651096, 29.748098904), (-19.80285, 25.0481))
        make_face(mode=Mode.SUBTRACT)
        with BuildLine():
            Line((-26.10965, 157.54), (-26.10965, 148.54))
            ThreePointArc((-26.10965, 148.54), (-23.56965, 146), (-21.02965, 148.54))
            Line((-21.02965, 148.54), (-21.02965, 157.54))
            ThreePointArc((-21.02965, 157.54), (-23.56965, 160.08), (-26.10965, 157.54))
        make_face(mode=Mode.SUBTRACT)
        with BuildLine():
            Line((-26.10965, 110.4), (-26.10965, 101.4))
            ThreePointArc((-26.10965, 101.4), (-23.56965, 98.86), (-21.02965, 101.4))
            Line((-21.02965, 101.4), (-21.02965, 110.4))
            ThreePointArc((-21.02965, 110.4), (-23.56965, 112.94), (-26.10965, 110.4))
        make_face(mode=Mode.SUBTRACT)
        with BuildLine():
            Line((-12.49965, 134.47), (-12.49965, 124.47))
            ThreePointArc((-12.49965, 124.47), (0.00035, 111.97), (12.50035, 124.47))
            Line((12.50035, 124.47), (12.50035, 134.47))
            ThreePointArc((12.50035, 134.47), (0.00035, 146.97), (-12.49965, 134.47))
        make_face(mode=Mode.SUBTRACT)
        with BuildLine():
            Line((21.03035, 157.54), (21.03035, 148.54))
            ThreePointArc((21.03035, 148.54), (23.57035, 146), (26.11035, 148.54))
            Line((26.11035, 148.54), (26.11035, 157.54))
            ThreePointArc((26.11035, 157.54), (23.57035, 160.08), (21.03035, 157.54))
        make_face(mode=Mode.SUBTRACT)
        with BuildLine():
            Line((21.03035, 110.4), (21.03035, 101.4))
            ThreePointArc((21.03035, 101.4), (23.57035, 98.86), (26.11035, 101.4))
            Line((26.11035, 101.4), (26.11035, 110.4))
            ThreePointArc((26.11035, 110.4), (23.57035, 112.94), (21.03035, 110.4))
        make_face(mode=Mode.SUBTRACT)
    extrude(amount=BOSS_EXTRUDE1_DEPTH)


solid = part.part
